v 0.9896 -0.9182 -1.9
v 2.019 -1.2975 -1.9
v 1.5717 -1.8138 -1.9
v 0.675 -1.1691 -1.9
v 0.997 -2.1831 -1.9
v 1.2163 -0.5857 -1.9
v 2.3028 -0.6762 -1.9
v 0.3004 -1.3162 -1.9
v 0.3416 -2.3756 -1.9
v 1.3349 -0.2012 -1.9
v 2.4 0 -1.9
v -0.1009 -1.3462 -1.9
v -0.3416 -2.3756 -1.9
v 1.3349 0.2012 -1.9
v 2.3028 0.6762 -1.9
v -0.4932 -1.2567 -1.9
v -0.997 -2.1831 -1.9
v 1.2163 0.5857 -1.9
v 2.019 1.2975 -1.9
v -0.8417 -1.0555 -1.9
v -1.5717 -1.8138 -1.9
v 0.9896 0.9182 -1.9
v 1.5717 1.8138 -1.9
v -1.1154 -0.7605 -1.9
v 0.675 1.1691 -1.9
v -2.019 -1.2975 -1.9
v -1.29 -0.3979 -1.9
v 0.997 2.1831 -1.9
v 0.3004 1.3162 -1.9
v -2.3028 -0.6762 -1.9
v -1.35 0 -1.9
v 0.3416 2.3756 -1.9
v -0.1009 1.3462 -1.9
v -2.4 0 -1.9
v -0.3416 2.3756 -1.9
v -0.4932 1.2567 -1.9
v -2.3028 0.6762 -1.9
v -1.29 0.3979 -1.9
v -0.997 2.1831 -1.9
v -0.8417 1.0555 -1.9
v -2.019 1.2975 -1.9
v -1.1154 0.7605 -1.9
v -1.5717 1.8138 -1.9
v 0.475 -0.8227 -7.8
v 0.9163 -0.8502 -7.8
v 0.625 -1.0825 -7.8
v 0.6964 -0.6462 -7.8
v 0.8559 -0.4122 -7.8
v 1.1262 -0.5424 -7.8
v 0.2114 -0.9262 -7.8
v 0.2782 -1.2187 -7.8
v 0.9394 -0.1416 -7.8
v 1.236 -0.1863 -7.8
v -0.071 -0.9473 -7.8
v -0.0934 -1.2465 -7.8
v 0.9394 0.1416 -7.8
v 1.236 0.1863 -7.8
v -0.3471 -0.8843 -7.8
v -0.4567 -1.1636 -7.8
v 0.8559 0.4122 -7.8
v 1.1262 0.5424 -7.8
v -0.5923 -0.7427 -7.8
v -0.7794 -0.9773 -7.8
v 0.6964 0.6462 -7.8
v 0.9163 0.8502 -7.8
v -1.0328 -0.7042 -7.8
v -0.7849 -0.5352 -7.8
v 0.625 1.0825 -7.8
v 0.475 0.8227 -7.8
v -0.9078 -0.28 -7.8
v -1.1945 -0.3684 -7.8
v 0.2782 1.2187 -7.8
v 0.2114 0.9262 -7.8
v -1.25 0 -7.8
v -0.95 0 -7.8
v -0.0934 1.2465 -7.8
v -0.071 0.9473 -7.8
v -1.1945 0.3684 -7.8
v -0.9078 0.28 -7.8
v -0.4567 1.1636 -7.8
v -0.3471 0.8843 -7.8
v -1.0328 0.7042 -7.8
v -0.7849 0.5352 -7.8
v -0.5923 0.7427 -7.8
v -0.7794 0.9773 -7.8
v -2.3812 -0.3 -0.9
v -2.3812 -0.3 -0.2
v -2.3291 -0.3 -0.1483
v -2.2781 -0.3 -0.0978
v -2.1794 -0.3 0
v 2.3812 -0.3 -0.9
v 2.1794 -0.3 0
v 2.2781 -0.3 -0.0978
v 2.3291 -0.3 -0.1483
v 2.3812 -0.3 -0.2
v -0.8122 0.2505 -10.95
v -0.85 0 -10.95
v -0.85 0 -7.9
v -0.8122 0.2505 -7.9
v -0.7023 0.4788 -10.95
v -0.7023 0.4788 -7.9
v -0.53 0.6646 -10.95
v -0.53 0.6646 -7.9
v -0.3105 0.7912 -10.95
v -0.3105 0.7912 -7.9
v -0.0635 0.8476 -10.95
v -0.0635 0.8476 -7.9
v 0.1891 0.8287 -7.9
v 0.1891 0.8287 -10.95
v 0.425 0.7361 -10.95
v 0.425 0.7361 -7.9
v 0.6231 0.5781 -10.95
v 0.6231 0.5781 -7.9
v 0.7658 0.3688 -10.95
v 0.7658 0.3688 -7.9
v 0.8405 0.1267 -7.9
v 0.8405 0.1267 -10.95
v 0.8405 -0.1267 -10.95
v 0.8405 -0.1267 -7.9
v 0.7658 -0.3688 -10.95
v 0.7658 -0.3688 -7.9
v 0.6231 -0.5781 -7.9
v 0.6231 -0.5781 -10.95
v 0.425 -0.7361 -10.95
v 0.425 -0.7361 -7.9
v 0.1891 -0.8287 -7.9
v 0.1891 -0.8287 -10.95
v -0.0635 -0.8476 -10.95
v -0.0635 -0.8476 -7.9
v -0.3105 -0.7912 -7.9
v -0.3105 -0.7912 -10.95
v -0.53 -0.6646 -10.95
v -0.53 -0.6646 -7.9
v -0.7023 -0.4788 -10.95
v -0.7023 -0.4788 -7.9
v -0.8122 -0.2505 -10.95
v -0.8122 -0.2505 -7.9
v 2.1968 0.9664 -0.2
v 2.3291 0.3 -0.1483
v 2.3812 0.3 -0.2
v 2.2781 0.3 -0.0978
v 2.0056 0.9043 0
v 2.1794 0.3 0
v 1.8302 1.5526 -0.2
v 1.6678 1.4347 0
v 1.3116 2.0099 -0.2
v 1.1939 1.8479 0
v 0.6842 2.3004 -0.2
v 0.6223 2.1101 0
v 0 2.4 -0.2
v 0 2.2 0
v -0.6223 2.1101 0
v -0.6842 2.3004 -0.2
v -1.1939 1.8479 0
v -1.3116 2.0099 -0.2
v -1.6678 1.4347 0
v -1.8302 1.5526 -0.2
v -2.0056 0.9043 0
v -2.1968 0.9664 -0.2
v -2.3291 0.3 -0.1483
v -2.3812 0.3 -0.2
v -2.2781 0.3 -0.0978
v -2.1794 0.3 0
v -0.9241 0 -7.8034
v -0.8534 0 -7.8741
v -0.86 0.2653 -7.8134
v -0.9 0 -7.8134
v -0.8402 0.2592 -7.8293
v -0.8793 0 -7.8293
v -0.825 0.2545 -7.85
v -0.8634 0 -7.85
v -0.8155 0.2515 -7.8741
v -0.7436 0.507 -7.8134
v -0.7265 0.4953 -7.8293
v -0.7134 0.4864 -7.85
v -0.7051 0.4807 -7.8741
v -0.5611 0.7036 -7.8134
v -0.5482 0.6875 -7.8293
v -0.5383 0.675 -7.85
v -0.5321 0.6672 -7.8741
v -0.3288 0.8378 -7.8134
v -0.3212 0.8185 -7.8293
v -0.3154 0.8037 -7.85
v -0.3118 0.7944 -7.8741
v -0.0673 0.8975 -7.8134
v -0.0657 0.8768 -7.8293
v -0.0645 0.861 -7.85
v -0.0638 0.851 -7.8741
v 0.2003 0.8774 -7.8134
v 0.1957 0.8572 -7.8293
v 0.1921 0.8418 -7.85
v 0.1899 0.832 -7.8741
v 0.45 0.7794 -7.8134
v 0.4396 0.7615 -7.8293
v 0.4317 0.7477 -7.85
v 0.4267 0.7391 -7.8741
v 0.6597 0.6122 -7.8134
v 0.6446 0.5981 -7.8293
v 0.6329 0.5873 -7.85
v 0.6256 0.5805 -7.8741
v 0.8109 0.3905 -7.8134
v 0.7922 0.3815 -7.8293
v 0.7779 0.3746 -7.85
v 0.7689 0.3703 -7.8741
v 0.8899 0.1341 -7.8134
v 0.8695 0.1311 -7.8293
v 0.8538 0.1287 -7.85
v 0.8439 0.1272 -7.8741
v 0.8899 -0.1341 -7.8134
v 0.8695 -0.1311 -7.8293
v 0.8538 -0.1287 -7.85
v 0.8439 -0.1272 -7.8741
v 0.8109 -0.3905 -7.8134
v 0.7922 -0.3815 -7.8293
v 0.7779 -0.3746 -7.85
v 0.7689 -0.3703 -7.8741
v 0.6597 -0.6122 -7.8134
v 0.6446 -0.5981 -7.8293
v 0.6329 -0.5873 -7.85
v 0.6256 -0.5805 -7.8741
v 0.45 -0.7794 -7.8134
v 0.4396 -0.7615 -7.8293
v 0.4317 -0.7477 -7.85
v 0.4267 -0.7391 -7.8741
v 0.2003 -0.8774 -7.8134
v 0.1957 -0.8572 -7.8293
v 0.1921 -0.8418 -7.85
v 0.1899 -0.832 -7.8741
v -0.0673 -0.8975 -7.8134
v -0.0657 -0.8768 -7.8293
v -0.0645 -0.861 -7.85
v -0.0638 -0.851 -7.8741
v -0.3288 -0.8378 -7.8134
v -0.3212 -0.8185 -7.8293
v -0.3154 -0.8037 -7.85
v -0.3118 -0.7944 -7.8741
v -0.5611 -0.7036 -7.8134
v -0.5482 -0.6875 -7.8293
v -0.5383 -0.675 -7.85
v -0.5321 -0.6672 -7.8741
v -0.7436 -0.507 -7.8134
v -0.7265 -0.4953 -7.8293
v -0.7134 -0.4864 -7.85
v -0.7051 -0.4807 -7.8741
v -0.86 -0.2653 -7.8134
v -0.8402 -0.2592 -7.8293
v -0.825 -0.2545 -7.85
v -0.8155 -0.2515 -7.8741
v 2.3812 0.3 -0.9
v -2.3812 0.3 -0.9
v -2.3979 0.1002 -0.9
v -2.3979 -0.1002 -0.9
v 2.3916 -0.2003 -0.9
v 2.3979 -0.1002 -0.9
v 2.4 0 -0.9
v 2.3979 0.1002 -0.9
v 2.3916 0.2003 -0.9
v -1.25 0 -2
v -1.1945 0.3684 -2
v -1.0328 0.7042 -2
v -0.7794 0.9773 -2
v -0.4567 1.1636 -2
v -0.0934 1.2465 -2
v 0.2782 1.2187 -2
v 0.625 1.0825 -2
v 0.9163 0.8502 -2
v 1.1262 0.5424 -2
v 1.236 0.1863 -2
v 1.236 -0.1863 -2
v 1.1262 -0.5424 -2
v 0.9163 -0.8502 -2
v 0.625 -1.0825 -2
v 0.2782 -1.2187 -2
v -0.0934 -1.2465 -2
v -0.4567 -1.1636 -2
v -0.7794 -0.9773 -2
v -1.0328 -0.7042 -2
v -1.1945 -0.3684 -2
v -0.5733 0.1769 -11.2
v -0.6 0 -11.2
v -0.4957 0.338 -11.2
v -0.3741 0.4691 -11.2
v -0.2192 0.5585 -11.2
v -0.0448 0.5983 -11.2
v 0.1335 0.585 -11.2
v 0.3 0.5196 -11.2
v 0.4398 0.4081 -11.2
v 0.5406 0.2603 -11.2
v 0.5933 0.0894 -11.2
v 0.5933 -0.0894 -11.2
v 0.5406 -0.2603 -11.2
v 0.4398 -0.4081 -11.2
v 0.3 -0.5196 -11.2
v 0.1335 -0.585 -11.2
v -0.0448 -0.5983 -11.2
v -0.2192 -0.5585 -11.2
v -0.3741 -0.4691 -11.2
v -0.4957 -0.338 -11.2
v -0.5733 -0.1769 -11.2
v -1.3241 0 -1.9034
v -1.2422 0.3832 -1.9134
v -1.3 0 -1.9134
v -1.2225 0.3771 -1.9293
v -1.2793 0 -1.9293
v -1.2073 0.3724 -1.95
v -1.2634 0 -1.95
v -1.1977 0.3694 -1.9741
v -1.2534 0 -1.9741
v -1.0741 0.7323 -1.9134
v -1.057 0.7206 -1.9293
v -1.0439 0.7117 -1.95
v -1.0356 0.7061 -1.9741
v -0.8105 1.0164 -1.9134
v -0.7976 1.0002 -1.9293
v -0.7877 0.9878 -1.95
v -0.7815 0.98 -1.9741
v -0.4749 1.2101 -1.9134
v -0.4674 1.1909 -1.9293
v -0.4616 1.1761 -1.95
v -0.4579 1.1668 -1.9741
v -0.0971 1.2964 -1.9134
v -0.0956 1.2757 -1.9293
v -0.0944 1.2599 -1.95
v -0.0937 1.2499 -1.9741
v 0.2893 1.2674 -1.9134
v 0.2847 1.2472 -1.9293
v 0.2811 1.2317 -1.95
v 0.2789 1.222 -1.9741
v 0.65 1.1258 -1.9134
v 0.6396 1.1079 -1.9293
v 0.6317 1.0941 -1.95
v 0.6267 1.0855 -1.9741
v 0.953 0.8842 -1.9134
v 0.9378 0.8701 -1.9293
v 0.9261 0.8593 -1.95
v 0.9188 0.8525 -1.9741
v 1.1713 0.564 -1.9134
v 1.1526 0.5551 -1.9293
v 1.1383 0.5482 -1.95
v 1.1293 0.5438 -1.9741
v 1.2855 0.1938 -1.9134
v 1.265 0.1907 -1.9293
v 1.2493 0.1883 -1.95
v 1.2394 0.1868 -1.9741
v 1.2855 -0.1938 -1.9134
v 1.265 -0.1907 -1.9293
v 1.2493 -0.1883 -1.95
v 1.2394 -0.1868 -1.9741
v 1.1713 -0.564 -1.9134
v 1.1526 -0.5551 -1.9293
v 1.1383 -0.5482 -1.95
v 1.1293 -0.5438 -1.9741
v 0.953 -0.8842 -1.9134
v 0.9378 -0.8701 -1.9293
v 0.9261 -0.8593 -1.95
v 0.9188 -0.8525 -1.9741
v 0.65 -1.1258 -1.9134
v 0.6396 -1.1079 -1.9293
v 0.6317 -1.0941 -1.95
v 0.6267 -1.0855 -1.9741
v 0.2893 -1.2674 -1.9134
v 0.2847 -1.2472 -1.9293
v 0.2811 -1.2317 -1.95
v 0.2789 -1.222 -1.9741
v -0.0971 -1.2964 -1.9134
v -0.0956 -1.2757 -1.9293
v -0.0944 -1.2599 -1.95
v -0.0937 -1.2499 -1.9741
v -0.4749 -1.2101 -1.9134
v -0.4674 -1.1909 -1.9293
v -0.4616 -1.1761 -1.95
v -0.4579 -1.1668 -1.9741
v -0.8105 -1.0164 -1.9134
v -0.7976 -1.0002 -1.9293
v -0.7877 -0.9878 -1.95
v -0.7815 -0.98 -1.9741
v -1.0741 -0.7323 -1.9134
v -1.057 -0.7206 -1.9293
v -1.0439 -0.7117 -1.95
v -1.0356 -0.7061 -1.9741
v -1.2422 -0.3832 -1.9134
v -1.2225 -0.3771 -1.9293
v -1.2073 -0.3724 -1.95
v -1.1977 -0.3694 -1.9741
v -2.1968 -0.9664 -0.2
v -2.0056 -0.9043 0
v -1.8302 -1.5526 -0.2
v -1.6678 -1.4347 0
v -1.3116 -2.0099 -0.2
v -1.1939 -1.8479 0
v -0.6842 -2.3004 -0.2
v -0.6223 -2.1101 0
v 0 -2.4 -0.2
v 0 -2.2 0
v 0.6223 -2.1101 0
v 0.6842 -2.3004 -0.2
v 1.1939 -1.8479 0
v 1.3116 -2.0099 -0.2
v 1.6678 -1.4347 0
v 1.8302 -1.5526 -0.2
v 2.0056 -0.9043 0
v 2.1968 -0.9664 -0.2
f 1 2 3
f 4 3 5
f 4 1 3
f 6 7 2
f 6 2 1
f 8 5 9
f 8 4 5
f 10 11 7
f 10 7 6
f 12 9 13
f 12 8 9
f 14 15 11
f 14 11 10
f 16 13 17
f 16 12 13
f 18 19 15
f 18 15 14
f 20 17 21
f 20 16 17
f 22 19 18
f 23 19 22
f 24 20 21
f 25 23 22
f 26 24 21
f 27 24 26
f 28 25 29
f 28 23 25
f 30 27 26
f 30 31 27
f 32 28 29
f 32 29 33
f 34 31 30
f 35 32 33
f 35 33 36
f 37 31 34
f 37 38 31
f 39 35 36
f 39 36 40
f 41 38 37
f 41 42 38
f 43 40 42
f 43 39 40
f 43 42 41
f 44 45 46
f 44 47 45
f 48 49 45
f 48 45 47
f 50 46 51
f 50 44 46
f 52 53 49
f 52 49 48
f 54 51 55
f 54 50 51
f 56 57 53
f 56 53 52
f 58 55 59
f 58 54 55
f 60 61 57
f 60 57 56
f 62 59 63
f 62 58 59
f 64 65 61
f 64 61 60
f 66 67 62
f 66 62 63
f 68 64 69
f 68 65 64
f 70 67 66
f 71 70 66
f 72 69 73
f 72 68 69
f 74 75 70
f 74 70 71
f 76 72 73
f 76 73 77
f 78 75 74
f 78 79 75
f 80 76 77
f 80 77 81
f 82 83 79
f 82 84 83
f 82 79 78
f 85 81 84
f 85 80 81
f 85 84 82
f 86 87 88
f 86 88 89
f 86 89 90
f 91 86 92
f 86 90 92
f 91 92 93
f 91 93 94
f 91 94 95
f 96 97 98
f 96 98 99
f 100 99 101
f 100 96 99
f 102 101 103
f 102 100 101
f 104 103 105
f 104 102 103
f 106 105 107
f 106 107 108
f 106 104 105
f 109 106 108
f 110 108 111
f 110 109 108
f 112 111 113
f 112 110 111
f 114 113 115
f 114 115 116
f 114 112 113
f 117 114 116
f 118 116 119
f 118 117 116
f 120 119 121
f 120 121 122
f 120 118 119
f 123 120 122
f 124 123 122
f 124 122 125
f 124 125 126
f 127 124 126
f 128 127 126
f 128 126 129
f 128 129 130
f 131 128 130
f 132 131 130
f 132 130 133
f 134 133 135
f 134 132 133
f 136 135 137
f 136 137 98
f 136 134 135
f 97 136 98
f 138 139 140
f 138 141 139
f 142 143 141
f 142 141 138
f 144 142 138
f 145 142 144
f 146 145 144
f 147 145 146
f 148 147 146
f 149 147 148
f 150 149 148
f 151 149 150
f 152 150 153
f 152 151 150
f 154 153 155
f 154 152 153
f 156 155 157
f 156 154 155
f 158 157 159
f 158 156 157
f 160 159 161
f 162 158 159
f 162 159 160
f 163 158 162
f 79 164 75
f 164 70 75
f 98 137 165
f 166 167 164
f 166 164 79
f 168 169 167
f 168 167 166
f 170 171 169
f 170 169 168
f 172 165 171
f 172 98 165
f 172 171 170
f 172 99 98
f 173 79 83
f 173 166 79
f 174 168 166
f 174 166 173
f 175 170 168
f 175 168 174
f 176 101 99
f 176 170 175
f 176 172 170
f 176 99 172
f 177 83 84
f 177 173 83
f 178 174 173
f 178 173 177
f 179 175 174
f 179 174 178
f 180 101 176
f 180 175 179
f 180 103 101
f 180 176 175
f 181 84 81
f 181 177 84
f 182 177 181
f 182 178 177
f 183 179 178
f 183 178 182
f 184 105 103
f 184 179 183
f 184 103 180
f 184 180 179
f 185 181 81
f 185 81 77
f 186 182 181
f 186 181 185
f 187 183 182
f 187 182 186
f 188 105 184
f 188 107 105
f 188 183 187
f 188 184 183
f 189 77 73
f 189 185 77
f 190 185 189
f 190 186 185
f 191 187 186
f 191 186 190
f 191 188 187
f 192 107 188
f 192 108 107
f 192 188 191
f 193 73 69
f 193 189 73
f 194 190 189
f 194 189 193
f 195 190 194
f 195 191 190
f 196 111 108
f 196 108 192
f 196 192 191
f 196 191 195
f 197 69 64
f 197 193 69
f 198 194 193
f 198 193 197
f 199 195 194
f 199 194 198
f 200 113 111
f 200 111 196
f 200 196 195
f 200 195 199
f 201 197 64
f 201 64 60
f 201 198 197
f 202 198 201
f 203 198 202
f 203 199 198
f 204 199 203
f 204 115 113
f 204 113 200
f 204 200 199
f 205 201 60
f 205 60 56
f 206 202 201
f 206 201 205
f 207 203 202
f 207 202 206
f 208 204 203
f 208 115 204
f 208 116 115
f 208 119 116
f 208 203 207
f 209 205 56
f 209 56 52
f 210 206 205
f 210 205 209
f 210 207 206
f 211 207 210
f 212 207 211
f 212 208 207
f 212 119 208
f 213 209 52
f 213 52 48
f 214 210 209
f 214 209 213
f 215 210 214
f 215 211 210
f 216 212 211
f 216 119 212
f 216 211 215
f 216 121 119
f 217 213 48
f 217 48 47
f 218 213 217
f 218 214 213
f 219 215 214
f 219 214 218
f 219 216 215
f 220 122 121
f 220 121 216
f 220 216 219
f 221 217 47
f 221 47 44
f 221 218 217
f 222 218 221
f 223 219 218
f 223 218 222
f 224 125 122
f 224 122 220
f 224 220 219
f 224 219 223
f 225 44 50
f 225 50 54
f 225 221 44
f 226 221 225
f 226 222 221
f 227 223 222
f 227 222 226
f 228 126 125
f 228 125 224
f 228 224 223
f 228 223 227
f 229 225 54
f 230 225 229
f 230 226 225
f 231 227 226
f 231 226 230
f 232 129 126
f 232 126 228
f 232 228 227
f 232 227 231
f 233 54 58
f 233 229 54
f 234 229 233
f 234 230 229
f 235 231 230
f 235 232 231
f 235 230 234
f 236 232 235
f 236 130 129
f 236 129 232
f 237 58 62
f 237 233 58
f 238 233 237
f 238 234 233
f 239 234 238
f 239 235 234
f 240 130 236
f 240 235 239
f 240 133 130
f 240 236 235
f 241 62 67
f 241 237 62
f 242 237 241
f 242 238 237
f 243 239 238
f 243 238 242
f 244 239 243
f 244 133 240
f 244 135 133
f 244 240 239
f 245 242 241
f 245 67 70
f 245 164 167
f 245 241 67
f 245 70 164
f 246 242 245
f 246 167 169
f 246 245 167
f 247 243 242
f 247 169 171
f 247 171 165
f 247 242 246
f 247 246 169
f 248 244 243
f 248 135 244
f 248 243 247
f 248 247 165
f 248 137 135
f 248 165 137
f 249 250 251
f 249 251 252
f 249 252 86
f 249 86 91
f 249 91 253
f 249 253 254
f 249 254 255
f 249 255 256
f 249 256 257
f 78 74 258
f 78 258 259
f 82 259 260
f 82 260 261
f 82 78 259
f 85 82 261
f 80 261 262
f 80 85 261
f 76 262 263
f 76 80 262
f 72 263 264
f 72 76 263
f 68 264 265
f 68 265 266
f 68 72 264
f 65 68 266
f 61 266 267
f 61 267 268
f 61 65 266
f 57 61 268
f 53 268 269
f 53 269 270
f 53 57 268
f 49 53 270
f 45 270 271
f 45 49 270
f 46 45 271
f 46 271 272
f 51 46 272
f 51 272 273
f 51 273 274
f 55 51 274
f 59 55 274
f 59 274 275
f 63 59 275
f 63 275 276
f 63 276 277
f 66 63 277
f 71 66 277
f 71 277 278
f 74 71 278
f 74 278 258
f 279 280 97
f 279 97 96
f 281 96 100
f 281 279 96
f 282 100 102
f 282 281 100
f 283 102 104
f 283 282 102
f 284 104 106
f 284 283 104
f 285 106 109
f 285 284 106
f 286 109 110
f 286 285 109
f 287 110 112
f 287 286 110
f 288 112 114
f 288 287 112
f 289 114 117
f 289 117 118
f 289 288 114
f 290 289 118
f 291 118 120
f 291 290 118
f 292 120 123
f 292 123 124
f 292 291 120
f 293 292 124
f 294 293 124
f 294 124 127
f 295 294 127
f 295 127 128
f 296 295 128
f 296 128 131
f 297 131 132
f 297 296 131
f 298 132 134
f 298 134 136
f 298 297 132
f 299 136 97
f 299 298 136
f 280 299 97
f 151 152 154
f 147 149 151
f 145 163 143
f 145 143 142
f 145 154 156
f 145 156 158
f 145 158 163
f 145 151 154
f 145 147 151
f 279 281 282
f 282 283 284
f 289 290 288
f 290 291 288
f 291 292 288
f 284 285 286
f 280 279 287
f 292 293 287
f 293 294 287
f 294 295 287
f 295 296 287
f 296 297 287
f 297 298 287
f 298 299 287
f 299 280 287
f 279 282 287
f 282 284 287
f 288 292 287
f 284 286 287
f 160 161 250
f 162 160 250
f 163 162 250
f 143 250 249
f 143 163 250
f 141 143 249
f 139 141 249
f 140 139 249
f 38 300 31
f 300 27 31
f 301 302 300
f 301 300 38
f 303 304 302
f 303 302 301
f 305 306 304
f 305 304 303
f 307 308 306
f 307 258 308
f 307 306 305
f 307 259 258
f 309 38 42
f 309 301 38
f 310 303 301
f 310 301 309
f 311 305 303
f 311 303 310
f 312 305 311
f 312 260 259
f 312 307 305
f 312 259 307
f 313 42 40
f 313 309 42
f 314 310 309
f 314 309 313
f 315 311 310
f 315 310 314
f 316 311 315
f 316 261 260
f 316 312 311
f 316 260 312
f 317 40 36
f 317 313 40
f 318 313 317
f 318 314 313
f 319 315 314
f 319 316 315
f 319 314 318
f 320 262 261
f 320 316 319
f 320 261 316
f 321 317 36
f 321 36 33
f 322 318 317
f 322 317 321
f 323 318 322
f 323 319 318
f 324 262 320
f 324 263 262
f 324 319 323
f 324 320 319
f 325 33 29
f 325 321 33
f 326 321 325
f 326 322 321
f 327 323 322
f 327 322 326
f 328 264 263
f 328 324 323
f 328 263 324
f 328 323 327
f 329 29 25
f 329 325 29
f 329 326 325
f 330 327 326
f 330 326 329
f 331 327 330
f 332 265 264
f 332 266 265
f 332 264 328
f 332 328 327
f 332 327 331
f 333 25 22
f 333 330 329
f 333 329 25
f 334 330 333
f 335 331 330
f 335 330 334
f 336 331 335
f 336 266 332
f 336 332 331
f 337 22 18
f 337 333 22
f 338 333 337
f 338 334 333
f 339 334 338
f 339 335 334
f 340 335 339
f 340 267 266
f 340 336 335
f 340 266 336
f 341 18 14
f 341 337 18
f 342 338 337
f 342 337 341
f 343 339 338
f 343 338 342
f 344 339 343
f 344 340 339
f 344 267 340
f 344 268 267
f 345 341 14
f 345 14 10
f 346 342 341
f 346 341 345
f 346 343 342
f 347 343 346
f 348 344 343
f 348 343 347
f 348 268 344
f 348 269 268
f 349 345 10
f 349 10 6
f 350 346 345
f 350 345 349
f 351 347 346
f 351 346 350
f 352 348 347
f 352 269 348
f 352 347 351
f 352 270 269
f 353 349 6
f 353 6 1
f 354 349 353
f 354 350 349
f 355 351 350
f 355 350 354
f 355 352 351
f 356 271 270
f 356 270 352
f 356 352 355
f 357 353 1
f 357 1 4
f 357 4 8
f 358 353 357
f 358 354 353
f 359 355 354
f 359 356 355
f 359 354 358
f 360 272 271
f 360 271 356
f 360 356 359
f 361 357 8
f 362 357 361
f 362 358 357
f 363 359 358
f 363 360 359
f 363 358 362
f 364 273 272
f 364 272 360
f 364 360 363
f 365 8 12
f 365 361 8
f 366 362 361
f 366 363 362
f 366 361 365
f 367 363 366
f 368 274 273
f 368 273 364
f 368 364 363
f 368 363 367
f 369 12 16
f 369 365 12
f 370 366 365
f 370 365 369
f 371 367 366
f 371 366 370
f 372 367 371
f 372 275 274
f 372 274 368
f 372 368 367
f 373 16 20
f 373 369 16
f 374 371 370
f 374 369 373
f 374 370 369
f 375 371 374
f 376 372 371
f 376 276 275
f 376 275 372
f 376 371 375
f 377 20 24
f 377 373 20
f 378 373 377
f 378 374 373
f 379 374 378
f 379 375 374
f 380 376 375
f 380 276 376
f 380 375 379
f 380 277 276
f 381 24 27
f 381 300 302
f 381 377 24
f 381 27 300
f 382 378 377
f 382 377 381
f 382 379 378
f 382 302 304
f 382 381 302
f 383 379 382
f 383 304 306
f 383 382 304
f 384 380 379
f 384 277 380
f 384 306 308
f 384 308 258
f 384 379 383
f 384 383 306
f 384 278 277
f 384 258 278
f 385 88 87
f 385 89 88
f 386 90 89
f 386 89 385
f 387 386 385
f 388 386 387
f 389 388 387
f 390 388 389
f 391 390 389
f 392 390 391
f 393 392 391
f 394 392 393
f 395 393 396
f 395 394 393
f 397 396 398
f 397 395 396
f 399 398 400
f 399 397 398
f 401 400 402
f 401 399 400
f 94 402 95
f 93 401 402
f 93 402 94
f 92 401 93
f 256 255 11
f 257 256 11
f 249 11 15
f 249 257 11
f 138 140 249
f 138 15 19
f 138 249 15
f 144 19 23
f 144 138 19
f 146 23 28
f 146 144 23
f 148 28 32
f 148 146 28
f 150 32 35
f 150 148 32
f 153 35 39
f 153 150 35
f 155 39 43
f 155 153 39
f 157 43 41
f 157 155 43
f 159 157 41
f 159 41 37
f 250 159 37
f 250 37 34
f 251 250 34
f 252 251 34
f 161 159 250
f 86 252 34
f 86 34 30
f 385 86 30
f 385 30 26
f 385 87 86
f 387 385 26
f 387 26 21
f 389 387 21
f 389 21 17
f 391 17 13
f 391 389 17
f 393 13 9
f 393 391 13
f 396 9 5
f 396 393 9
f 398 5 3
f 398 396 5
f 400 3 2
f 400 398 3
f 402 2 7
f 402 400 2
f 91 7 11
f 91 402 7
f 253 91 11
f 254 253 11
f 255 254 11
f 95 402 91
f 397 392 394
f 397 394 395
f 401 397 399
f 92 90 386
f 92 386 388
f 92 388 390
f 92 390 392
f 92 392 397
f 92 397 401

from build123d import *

# Parameters (mm, degrees)
SKETCH2_R           = 2.4
BOSS_EXTRUDE1_DEPTH = 11.2
SKETCH4_OUTSIDE_W   = 9.42
SKETCH4_OUTSIDE_H   = 9.42
SKETCH4_OUTSIDE_R   = 1.25
CUT_EXTRUDE1_DEPTH  = 9.3
SKETCH5_OUTSIDE_W   = 9.42
SKETCH5_OUTSIDE_H   = 9.42
SKETCH5_OUTSIDE_R   = 0.85
CUT_EXTRUDE2_DEPTH  = 3.4
SKETCH6_W           = 5
SKETCH6_H           = 0.6
CUT_EXTRUDE3_DEPTH  = 0.9
FILLET1_R           = 0.1
CHAMFER2_SIZE       = 0.2
CHAMFER1_SIZE       = 0.25


with BuildPart() as part:
    # Sketch2 → Boss-Extrude1 (new body)
    with BuildSketch(Plane.XY):
        Circle(SKETCH2_R)
    extrude(amount=-BOSS_EXTRUDE1_DEPTH)

    # Sketch4 outside → Cut-Extrude1 (cut)
    with BuildSketch(Plane(origin=(0, 0, -11.2), x_dir=(-1, 0, 0), z_dir=(0, 0, -1))):
        Rectangle(SKETCH4_OUTSIDE_W, SKETCH4_OUTSIDE_H)
        Circle(SKETCH4_OUTSIDE_R, mode=Mode.SUBTRACT)
    extrude(amount=-CUT_EXTRUDE1_DEPTH, mode=Mode.SUBTRACT)

    # Sketch5 outside → Cut-Extrude2 (cut)
    with BuildSketch(Plane(origin=(0, 0, -11.2), x_dir=(-1, 0, 0), z_dir=(0, 0, -1))):
        Rectangle(SKETCH5_OUTSIDE_W, SKETCH5_OUTSIDE_H)
        Circle(SKETCH5_OUTSIDE_R, mode=Mode.SUBTRACT)
    extrude(amount=-CUT_EXTRUDE2_DEPTH, mode=Mode.SUBTRACT)

    # Sketch6 → Cut-Extrude3 (cut)
    with BuildSketch(Plane.XY):
        Rectangle(SKETCH6_W, SKETCH6_H)
    extrude(amount=-CUT_EXTRUDE3_DEPTH, mode=Mode.SUBTRACT)

    # Fillet1
    fillet1_edges = [part.edges().sort_by_distance(p)[0] for p in [
        (1.25, 0, -1.9),
        (0.85, 0, -7.8),
    ]]
    fillet(fillet1_edges, radius=FILLET1_R)

    # Chamfer2
    chamfer2_edges = [part.edges().sort_by_distance(p)[0] for p in [
        (0, 2.4, 0),
        (0, -2.4, 0),
    ]]
    chamfer(chamfer2_edges, length=CHAMFER2_SIZE)

    # Chamfer1
    chamfer1_edges = [part.edges().sort_by_distance(p)[0] for p in [
        (0.85, 0, -11.2),
    ]]
    chamfer(chamfer1_edges, length=CHAMFER1_SIZE)


solid = part.part
